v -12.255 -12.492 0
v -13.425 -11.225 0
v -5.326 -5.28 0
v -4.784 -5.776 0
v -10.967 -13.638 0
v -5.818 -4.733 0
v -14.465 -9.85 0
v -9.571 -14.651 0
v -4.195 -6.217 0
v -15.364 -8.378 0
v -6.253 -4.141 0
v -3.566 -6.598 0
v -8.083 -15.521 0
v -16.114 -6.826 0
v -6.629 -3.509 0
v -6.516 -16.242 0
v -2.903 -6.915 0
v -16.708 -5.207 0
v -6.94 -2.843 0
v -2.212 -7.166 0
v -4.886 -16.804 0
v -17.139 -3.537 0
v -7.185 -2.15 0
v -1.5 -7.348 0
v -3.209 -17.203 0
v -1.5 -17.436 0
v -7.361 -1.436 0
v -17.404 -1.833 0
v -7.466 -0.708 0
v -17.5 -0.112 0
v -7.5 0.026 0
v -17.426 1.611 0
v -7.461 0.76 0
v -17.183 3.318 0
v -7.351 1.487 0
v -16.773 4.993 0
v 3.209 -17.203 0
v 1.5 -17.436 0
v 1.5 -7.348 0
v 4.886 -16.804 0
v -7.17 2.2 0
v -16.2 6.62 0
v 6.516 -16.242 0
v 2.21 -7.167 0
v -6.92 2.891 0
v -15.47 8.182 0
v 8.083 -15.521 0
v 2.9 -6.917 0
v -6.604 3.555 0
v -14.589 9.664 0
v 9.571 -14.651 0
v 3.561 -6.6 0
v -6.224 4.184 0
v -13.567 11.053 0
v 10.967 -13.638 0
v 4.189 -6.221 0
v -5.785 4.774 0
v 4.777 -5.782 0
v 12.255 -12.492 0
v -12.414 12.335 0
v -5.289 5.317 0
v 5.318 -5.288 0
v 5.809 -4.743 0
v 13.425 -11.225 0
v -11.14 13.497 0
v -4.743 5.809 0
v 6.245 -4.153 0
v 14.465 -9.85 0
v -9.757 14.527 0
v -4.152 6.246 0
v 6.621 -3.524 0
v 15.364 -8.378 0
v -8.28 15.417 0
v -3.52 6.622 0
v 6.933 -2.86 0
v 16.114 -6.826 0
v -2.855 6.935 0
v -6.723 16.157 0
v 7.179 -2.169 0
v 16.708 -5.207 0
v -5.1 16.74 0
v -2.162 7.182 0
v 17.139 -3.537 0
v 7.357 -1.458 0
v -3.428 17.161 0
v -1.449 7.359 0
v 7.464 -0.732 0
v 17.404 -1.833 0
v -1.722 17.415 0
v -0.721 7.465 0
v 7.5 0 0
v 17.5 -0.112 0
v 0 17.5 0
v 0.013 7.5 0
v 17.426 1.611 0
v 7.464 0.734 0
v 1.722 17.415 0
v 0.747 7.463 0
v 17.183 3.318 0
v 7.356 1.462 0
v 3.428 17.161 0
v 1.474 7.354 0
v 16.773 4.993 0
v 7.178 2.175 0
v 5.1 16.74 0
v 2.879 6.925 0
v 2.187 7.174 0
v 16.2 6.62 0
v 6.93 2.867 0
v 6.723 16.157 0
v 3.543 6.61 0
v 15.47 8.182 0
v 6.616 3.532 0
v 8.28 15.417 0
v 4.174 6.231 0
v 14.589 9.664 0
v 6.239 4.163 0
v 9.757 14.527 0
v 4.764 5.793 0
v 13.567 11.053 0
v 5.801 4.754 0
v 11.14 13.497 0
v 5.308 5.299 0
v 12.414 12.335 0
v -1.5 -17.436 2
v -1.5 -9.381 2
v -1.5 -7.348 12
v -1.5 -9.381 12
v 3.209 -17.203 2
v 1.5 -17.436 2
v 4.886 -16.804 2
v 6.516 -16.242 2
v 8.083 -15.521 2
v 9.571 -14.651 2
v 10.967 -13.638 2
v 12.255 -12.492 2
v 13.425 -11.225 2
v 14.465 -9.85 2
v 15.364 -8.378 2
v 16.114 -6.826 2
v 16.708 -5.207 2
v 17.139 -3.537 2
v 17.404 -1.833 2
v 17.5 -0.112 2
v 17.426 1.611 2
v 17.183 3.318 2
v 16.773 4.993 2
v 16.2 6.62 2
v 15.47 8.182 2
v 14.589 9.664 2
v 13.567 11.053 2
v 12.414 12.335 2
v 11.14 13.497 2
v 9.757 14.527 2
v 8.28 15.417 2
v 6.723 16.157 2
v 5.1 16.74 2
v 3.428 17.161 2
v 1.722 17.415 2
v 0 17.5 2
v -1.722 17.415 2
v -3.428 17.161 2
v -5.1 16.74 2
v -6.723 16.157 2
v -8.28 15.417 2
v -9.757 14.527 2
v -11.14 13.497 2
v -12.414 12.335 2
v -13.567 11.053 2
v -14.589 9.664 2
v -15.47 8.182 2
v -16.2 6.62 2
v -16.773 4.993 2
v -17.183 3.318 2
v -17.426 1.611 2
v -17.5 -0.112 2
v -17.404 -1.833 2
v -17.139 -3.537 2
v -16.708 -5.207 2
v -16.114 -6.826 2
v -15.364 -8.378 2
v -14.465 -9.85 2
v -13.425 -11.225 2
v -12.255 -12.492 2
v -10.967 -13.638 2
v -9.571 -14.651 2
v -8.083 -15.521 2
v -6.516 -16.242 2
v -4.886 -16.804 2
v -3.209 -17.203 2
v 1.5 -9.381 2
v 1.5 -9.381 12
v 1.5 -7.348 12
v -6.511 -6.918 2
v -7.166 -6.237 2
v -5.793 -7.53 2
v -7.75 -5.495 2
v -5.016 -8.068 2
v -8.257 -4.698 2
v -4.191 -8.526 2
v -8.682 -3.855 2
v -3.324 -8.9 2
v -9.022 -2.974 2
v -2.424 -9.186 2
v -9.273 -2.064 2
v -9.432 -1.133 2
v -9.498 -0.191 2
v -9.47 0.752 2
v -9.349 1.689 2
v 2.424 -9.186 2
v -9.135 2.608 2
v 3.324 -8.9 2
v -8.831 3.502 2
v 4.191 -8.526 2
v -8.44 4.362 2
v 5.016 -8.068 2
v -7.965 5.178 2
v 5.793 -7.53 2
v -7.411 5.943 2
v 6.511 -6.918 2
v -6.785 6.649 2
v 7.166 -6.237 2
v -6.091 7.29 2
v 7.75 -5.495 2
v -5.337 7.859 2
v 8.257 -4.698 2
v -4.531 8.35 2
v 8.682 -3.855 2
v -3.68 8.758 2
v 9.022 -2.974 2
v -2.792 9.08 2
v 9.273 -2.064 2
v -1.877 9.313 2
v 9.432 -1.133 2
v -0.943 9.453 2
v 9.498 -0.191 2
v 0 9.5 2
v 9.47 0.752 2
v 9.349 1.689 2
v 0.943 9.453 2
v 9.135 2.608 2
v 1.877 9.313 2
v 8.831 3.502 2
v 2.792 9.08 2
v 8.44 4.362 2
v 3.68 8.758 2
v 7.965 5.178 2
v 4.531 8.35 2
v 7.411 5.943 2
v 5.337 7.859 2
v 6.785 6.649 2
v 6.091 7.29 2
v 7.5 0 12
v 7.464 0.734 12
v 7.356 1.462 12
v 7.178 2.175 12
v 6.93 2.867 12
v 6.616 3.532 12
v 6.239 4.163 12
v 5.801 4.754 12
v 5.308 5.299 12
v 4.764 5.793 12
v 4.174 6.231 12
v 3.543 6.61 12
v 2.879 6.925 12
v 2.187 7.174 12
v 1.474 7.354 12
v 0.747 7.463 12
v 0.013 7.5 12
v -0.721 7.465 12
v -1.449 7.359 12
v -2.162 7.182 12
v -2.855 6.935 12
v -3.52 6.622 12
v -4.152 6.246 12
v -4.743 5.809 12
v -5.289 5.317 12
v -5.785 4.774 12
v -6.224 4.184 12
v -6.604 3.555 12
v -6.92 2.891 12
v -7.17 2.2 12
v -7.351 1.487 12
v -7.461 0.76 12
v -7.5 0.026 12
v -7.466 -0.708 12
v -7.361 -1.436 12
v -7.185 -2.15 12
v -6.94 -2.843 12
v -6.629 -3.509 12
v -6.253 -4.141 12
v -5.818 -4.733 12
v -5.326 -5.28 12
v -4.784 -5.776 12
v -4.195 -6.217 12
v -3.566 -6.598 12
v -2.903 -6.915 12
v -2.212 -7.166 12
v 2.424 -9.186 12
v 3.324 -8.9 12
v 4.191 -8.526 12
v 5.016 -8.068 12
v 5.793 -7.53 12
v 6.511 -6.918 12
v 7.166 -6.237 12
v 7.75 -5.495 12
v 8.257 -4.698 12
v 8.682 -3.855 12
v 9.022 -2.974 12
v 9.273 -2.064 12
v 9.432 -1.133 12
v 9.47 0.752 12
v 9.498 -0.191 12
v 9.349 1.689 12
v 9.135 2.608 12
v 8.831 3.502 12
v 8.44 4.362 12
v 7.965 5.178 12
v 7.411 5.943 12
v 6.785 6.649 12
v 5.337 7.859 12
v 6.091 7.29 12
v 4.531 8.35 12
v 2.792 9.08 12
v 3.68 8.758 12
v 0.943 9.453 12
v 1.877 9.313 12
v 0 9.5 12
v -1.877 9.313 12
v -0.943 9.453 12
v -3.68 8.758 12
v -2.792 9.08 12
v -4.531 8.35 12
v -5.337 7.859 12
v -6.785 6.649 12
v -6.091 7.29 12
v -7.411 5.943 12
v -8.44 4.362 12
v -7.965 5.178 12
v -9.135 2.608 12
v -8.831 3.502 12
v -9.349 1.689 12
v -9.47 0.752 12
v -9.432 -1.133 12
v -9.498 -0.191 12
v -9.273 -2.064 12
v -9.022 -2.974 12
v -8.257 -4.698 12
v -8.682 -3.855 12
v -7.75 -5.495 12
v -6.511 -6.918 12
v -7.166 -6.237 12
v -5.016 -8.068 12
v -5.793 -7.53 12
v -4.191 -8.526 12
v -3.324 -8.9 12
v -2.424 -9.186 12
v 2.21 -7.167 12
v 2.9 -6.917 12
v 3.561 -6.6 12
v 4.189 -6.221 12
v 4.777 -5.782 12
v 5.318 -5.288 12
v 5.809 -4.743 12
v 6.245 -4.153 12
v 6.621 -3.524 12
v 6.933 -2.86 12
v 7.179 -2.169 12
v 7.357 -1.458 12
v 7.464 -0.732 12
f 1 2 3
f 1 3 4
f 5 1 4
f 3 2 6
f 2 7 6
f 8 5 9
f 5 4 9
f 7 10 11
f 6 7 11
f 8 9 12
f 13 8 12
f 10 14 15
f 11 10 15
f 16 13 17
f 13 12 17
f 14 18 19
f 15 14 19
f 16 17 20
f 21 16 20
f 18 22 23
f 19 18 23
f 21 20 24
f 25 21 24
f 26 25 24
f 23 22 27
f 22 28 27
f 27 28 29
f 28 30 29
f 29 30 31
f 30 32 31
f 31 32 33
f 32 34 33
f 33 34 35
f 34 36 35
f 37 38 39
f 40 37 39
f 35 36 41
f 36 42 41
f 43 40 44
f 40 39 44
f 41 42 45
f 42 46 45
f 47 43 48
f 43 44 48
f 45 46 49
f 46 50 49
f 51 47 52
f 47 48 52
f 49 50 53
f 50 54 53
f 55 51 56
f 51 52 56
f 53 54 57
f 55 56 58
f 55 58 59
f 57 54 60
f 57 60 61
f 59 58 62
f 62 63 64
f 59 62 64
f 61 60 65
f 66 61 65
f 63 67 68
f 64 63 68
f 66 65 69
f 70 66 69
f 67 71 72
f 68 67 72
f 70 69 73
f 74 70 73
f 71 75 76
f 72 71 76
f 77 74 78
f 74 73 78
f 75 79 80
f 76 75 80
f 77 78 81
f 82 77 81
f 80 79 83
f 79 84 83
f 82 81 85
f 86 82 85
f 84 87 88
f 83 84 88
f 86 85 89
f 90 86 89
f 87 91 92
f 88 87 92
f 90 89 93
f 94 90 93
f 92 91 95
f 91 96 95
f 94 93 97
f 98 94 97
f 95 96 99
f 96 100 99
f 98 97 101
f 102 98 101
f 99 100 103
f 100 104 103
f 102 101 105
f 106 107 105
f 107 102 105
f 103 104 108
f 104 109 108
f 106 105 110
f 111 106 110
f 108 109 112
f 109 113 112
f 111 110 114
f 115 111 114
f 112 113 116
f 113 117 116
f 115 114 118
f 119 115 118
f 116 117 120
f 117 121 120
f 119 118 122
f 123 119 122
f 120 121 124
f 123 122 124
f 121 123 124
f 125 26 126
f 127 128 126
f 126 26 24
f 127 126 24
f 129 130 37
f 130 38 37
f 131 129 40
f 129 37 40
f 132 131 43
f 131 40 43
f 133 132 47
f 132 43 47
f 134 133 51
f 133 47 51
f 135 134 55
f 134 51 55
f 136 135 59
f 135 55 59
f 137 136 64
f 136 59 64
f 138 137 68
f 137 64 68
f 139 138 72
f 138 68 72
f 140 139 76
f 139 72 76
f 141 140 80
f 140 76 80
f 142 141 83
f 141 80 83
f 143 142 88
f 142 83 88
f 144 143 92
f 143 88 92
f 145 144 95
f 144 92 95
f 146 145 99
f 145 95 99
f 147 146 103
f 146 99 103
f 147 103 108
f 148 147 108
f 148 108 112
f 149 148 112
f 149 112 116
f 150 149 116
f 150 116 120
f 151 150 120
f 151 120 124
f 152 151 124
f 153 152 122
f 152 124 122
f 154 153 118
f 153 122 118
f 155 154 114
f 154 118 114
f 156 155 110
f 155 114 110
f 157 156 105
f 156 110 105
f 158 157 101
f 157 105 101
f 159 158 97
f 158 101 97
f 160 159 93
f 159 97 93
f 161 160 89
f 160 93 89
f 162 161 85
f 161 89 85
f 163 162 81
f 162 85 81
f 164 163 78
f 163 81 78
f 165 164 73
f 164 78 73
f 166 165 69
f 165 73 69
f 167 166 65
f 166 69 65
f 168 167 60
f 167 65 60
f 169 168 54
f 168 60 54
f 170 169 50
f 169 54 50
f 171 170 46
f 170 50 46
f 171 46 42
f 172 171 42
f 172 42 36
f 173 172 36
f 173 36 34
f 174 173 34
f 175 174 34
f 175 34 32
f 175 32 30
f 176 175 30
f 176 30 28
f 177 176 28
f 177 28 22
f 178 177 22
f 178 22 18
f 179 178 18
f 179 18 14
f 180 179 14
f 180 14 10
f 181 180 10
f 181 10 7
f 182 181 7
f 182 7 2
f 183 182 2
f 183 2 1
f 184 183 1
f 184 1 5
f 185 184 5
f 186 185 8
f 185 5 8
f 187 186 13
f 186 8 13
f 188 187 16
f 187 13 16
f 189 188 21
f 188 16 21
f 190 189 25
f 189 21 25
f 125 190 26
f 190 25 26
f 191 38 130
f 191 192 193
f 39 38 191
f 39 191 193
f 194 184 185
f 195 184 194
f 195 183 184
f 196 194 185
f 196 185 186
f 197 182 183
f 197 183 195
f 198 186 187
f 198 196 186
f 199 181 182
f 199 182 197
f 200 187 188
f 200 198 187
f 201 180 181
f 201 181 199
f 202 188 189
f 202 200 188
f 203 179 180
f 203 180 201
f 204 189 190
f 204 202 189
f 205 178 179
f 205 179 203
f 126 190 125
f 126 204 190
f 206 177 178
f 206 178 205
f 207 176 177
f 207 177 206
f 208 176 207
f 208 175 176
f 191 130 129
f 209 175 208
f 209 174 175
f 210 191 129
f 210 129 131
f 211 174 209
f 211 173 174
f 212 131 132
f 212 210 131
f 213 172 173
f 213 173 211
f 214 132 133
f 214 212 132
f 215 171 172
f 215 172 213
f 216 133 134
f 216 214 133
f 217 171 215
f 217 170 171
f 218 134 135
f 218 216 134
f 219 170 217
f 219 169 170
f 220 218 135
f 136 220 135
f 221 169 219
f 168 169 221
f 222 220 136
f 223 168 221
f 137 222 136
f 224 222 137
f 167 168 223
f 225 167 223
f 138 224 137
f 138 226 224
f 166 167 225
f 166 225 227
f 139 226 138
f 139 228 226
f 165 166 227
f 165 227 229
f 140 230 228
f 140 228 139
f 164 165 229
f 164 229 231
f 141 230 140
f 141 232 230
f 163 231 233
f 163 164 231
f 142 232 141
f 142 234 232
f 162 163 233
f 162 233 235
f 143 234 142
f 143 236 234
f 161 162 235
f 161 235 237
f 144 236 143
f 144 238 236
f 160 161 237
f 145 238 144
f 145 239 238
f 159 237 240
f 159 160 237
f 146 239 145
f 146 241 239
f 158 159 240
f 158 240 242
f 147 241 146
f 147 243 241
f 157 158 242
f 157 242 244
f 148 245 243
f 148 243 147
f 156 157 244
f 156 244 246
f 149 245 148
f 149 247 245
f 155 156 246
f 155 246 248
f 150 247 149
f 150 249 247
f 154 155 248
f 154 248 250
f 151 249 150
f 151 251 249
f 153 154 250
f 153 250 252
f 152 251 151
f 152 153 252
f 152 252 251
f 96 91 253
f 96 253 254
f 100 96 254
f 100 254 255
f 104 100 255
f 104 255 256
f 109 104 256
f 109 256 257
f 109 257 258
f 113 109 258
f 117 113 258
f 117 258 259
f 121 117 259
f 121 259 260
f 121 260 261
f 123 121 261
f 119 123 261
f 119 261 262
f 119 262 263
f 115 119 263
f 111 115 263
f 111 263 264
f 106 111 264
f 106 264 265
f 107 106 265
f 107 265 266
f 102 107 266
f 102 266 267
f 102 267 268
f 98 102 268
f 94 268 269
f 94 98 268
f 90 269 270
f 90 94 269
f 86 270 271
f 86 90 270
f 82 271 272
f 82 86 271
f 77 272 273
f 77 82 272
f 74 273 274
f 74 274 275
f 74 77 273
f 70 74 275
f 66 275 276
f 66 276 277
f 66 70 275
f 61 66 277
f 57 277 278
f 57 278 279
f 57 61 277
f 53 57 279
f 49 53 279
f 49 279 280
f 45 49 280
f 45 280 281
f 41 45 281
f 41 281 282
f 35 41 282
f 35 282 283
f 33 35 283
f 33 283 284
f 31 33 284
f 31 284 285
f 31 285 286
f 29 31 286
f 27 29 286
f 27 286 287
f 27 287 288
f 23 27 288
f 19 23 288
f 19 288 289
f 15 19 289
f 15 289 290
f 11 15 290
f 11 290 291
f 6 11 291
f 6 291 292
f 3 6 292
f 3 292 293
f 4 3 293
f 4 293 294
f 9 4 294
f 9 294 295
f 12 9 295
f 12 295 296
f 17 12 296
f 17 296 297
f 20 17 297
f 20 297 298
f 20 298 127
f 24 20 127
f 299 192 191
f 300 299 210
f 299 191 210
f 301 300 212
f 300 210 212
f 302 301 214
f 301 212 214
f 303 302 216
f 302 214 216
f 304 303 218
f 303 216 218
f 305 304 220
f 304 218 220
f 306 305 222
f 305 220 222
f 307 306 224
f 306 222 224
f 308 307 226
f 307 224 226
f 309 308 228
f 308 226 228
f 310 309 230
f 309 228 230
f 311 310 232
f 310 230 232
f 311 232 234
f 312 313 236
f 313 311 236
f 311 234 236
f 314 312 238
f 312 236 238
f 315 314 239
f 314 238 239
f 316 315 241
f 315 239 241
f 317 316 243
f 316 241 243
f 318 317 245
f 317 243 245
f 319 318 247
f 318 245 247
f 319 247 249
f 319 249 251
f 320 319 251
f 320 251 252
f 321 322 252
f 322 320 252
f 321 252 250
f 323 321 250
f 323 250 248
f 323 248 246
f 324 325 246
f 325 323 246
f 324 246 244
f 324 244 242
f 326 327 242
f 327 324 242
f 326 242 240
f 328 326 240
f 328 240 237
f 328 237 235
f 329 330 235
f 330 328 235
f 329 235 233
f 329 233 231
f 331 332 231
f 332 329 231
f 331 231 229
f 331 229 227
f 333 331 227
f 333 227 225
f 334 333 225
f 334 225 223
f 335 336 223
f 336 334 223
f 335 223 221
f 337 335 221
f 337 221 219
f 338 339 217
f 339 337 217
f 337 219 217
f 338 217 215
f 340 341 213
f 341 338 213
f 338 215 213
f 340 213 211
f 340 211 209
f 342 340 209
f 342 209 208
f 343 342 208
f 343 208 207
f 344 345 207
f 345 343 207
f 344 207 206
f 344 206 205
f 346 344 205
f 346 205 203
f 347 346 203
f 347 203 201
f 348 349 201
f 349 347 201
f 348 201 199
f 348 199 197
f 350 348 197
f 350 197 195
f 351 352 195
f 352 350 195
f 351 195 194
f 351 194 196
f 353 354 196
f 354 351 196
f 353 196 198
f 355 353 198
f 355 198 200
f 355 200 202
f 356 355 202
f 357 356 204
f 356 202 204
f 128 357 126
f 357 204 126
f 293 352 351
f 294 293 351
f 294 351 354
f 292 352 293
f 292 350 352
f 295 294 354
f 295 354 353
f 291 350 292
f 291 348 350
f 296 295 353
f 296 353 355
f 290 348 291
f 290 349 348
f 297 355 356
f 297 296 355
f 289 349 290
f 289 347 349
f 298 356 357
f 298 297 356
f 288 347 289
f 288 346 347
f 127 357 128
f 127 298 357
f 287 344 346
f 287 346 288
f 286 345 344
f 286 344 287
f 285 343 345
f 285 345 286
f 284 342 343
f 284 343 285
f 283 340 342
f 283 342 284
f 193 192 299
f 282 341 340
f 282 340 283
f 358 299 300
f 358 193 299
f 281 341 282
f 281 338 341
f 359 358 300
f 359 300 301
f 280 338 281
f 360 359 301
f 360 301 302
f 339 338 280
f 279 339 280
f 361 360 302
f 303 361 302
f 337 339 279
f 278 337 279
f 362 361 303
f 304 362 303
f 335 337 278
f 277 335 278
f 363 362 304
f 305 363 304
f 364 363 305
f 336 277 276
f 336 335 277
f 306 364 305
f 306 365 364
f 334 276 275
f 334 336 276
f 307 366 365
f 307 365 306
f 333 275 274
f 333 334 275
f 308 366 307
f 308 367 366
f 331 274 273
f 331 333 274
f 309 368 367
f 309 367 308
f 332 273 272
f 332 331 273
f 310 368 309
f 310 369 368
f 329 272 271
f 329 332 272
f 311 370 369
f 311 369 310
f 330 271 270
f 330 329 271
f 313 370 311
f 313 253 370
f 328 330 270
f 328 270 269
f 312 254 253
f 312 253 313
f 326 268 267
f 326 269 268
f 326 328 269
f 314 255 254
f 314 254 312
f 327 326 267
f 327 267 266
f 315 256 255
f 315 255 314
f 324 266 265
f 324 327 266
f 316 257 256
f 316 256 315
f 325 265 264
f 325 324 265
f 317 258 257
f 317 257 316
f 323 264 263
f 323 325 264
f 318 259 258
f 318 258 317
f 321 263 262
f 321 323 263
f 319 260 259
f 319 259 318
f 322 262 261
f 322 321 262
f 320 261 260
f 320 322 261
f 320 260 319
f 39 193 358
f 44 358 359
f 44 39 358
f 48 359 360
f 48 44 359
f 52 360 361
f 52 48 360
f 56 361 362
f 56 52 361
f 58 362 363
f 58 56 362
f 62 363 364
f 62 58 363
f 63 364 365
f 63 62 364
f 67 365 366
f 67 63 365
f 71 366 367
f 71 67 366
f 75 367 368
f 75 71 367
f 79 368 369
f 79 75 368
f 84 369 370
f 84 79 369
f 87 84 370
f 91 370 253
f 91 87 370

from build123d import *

# Parameters (mm, degrees)
F0_R     = 17.5
F0_R_2   = 7.5
F1_DEPTH = 2
F2_R     = 9.5
F2_R_2   = 7.5
F3_DEPTH = 10
F4_W     = 3
F4_H     = 10.151531
F5_DEPTH = 12.001


with BuildPart() as f1:
    # F0 (on Top) → F1 (new body)
    with BuildSketch(Plane.XY):
        Circle(F0_R)
        Circle(F0_R_2, mode=Mode.SUBTRACT)
    extrude(amount=F1_DEPTH)

    # F2 (on face) → F3 (join)
    with BuildSketch(Plane.XY.offset(2)):
        Circle(F2_R)
        Circle(F2_R_2, mode=Mode.SUBTRACT)
    extrude(amount=F3_DEPTH)

    # F4 (on Top) → F5 (cut, through all)
    with BuildSketch(Plane.XY):
        with Locations((0, -12.424235)):
            Rectangle(F4_W, F4_H)
    extrude(amount=F5_DEPTH, mode=Mode.SUBTRACT)


solid = f1.part
